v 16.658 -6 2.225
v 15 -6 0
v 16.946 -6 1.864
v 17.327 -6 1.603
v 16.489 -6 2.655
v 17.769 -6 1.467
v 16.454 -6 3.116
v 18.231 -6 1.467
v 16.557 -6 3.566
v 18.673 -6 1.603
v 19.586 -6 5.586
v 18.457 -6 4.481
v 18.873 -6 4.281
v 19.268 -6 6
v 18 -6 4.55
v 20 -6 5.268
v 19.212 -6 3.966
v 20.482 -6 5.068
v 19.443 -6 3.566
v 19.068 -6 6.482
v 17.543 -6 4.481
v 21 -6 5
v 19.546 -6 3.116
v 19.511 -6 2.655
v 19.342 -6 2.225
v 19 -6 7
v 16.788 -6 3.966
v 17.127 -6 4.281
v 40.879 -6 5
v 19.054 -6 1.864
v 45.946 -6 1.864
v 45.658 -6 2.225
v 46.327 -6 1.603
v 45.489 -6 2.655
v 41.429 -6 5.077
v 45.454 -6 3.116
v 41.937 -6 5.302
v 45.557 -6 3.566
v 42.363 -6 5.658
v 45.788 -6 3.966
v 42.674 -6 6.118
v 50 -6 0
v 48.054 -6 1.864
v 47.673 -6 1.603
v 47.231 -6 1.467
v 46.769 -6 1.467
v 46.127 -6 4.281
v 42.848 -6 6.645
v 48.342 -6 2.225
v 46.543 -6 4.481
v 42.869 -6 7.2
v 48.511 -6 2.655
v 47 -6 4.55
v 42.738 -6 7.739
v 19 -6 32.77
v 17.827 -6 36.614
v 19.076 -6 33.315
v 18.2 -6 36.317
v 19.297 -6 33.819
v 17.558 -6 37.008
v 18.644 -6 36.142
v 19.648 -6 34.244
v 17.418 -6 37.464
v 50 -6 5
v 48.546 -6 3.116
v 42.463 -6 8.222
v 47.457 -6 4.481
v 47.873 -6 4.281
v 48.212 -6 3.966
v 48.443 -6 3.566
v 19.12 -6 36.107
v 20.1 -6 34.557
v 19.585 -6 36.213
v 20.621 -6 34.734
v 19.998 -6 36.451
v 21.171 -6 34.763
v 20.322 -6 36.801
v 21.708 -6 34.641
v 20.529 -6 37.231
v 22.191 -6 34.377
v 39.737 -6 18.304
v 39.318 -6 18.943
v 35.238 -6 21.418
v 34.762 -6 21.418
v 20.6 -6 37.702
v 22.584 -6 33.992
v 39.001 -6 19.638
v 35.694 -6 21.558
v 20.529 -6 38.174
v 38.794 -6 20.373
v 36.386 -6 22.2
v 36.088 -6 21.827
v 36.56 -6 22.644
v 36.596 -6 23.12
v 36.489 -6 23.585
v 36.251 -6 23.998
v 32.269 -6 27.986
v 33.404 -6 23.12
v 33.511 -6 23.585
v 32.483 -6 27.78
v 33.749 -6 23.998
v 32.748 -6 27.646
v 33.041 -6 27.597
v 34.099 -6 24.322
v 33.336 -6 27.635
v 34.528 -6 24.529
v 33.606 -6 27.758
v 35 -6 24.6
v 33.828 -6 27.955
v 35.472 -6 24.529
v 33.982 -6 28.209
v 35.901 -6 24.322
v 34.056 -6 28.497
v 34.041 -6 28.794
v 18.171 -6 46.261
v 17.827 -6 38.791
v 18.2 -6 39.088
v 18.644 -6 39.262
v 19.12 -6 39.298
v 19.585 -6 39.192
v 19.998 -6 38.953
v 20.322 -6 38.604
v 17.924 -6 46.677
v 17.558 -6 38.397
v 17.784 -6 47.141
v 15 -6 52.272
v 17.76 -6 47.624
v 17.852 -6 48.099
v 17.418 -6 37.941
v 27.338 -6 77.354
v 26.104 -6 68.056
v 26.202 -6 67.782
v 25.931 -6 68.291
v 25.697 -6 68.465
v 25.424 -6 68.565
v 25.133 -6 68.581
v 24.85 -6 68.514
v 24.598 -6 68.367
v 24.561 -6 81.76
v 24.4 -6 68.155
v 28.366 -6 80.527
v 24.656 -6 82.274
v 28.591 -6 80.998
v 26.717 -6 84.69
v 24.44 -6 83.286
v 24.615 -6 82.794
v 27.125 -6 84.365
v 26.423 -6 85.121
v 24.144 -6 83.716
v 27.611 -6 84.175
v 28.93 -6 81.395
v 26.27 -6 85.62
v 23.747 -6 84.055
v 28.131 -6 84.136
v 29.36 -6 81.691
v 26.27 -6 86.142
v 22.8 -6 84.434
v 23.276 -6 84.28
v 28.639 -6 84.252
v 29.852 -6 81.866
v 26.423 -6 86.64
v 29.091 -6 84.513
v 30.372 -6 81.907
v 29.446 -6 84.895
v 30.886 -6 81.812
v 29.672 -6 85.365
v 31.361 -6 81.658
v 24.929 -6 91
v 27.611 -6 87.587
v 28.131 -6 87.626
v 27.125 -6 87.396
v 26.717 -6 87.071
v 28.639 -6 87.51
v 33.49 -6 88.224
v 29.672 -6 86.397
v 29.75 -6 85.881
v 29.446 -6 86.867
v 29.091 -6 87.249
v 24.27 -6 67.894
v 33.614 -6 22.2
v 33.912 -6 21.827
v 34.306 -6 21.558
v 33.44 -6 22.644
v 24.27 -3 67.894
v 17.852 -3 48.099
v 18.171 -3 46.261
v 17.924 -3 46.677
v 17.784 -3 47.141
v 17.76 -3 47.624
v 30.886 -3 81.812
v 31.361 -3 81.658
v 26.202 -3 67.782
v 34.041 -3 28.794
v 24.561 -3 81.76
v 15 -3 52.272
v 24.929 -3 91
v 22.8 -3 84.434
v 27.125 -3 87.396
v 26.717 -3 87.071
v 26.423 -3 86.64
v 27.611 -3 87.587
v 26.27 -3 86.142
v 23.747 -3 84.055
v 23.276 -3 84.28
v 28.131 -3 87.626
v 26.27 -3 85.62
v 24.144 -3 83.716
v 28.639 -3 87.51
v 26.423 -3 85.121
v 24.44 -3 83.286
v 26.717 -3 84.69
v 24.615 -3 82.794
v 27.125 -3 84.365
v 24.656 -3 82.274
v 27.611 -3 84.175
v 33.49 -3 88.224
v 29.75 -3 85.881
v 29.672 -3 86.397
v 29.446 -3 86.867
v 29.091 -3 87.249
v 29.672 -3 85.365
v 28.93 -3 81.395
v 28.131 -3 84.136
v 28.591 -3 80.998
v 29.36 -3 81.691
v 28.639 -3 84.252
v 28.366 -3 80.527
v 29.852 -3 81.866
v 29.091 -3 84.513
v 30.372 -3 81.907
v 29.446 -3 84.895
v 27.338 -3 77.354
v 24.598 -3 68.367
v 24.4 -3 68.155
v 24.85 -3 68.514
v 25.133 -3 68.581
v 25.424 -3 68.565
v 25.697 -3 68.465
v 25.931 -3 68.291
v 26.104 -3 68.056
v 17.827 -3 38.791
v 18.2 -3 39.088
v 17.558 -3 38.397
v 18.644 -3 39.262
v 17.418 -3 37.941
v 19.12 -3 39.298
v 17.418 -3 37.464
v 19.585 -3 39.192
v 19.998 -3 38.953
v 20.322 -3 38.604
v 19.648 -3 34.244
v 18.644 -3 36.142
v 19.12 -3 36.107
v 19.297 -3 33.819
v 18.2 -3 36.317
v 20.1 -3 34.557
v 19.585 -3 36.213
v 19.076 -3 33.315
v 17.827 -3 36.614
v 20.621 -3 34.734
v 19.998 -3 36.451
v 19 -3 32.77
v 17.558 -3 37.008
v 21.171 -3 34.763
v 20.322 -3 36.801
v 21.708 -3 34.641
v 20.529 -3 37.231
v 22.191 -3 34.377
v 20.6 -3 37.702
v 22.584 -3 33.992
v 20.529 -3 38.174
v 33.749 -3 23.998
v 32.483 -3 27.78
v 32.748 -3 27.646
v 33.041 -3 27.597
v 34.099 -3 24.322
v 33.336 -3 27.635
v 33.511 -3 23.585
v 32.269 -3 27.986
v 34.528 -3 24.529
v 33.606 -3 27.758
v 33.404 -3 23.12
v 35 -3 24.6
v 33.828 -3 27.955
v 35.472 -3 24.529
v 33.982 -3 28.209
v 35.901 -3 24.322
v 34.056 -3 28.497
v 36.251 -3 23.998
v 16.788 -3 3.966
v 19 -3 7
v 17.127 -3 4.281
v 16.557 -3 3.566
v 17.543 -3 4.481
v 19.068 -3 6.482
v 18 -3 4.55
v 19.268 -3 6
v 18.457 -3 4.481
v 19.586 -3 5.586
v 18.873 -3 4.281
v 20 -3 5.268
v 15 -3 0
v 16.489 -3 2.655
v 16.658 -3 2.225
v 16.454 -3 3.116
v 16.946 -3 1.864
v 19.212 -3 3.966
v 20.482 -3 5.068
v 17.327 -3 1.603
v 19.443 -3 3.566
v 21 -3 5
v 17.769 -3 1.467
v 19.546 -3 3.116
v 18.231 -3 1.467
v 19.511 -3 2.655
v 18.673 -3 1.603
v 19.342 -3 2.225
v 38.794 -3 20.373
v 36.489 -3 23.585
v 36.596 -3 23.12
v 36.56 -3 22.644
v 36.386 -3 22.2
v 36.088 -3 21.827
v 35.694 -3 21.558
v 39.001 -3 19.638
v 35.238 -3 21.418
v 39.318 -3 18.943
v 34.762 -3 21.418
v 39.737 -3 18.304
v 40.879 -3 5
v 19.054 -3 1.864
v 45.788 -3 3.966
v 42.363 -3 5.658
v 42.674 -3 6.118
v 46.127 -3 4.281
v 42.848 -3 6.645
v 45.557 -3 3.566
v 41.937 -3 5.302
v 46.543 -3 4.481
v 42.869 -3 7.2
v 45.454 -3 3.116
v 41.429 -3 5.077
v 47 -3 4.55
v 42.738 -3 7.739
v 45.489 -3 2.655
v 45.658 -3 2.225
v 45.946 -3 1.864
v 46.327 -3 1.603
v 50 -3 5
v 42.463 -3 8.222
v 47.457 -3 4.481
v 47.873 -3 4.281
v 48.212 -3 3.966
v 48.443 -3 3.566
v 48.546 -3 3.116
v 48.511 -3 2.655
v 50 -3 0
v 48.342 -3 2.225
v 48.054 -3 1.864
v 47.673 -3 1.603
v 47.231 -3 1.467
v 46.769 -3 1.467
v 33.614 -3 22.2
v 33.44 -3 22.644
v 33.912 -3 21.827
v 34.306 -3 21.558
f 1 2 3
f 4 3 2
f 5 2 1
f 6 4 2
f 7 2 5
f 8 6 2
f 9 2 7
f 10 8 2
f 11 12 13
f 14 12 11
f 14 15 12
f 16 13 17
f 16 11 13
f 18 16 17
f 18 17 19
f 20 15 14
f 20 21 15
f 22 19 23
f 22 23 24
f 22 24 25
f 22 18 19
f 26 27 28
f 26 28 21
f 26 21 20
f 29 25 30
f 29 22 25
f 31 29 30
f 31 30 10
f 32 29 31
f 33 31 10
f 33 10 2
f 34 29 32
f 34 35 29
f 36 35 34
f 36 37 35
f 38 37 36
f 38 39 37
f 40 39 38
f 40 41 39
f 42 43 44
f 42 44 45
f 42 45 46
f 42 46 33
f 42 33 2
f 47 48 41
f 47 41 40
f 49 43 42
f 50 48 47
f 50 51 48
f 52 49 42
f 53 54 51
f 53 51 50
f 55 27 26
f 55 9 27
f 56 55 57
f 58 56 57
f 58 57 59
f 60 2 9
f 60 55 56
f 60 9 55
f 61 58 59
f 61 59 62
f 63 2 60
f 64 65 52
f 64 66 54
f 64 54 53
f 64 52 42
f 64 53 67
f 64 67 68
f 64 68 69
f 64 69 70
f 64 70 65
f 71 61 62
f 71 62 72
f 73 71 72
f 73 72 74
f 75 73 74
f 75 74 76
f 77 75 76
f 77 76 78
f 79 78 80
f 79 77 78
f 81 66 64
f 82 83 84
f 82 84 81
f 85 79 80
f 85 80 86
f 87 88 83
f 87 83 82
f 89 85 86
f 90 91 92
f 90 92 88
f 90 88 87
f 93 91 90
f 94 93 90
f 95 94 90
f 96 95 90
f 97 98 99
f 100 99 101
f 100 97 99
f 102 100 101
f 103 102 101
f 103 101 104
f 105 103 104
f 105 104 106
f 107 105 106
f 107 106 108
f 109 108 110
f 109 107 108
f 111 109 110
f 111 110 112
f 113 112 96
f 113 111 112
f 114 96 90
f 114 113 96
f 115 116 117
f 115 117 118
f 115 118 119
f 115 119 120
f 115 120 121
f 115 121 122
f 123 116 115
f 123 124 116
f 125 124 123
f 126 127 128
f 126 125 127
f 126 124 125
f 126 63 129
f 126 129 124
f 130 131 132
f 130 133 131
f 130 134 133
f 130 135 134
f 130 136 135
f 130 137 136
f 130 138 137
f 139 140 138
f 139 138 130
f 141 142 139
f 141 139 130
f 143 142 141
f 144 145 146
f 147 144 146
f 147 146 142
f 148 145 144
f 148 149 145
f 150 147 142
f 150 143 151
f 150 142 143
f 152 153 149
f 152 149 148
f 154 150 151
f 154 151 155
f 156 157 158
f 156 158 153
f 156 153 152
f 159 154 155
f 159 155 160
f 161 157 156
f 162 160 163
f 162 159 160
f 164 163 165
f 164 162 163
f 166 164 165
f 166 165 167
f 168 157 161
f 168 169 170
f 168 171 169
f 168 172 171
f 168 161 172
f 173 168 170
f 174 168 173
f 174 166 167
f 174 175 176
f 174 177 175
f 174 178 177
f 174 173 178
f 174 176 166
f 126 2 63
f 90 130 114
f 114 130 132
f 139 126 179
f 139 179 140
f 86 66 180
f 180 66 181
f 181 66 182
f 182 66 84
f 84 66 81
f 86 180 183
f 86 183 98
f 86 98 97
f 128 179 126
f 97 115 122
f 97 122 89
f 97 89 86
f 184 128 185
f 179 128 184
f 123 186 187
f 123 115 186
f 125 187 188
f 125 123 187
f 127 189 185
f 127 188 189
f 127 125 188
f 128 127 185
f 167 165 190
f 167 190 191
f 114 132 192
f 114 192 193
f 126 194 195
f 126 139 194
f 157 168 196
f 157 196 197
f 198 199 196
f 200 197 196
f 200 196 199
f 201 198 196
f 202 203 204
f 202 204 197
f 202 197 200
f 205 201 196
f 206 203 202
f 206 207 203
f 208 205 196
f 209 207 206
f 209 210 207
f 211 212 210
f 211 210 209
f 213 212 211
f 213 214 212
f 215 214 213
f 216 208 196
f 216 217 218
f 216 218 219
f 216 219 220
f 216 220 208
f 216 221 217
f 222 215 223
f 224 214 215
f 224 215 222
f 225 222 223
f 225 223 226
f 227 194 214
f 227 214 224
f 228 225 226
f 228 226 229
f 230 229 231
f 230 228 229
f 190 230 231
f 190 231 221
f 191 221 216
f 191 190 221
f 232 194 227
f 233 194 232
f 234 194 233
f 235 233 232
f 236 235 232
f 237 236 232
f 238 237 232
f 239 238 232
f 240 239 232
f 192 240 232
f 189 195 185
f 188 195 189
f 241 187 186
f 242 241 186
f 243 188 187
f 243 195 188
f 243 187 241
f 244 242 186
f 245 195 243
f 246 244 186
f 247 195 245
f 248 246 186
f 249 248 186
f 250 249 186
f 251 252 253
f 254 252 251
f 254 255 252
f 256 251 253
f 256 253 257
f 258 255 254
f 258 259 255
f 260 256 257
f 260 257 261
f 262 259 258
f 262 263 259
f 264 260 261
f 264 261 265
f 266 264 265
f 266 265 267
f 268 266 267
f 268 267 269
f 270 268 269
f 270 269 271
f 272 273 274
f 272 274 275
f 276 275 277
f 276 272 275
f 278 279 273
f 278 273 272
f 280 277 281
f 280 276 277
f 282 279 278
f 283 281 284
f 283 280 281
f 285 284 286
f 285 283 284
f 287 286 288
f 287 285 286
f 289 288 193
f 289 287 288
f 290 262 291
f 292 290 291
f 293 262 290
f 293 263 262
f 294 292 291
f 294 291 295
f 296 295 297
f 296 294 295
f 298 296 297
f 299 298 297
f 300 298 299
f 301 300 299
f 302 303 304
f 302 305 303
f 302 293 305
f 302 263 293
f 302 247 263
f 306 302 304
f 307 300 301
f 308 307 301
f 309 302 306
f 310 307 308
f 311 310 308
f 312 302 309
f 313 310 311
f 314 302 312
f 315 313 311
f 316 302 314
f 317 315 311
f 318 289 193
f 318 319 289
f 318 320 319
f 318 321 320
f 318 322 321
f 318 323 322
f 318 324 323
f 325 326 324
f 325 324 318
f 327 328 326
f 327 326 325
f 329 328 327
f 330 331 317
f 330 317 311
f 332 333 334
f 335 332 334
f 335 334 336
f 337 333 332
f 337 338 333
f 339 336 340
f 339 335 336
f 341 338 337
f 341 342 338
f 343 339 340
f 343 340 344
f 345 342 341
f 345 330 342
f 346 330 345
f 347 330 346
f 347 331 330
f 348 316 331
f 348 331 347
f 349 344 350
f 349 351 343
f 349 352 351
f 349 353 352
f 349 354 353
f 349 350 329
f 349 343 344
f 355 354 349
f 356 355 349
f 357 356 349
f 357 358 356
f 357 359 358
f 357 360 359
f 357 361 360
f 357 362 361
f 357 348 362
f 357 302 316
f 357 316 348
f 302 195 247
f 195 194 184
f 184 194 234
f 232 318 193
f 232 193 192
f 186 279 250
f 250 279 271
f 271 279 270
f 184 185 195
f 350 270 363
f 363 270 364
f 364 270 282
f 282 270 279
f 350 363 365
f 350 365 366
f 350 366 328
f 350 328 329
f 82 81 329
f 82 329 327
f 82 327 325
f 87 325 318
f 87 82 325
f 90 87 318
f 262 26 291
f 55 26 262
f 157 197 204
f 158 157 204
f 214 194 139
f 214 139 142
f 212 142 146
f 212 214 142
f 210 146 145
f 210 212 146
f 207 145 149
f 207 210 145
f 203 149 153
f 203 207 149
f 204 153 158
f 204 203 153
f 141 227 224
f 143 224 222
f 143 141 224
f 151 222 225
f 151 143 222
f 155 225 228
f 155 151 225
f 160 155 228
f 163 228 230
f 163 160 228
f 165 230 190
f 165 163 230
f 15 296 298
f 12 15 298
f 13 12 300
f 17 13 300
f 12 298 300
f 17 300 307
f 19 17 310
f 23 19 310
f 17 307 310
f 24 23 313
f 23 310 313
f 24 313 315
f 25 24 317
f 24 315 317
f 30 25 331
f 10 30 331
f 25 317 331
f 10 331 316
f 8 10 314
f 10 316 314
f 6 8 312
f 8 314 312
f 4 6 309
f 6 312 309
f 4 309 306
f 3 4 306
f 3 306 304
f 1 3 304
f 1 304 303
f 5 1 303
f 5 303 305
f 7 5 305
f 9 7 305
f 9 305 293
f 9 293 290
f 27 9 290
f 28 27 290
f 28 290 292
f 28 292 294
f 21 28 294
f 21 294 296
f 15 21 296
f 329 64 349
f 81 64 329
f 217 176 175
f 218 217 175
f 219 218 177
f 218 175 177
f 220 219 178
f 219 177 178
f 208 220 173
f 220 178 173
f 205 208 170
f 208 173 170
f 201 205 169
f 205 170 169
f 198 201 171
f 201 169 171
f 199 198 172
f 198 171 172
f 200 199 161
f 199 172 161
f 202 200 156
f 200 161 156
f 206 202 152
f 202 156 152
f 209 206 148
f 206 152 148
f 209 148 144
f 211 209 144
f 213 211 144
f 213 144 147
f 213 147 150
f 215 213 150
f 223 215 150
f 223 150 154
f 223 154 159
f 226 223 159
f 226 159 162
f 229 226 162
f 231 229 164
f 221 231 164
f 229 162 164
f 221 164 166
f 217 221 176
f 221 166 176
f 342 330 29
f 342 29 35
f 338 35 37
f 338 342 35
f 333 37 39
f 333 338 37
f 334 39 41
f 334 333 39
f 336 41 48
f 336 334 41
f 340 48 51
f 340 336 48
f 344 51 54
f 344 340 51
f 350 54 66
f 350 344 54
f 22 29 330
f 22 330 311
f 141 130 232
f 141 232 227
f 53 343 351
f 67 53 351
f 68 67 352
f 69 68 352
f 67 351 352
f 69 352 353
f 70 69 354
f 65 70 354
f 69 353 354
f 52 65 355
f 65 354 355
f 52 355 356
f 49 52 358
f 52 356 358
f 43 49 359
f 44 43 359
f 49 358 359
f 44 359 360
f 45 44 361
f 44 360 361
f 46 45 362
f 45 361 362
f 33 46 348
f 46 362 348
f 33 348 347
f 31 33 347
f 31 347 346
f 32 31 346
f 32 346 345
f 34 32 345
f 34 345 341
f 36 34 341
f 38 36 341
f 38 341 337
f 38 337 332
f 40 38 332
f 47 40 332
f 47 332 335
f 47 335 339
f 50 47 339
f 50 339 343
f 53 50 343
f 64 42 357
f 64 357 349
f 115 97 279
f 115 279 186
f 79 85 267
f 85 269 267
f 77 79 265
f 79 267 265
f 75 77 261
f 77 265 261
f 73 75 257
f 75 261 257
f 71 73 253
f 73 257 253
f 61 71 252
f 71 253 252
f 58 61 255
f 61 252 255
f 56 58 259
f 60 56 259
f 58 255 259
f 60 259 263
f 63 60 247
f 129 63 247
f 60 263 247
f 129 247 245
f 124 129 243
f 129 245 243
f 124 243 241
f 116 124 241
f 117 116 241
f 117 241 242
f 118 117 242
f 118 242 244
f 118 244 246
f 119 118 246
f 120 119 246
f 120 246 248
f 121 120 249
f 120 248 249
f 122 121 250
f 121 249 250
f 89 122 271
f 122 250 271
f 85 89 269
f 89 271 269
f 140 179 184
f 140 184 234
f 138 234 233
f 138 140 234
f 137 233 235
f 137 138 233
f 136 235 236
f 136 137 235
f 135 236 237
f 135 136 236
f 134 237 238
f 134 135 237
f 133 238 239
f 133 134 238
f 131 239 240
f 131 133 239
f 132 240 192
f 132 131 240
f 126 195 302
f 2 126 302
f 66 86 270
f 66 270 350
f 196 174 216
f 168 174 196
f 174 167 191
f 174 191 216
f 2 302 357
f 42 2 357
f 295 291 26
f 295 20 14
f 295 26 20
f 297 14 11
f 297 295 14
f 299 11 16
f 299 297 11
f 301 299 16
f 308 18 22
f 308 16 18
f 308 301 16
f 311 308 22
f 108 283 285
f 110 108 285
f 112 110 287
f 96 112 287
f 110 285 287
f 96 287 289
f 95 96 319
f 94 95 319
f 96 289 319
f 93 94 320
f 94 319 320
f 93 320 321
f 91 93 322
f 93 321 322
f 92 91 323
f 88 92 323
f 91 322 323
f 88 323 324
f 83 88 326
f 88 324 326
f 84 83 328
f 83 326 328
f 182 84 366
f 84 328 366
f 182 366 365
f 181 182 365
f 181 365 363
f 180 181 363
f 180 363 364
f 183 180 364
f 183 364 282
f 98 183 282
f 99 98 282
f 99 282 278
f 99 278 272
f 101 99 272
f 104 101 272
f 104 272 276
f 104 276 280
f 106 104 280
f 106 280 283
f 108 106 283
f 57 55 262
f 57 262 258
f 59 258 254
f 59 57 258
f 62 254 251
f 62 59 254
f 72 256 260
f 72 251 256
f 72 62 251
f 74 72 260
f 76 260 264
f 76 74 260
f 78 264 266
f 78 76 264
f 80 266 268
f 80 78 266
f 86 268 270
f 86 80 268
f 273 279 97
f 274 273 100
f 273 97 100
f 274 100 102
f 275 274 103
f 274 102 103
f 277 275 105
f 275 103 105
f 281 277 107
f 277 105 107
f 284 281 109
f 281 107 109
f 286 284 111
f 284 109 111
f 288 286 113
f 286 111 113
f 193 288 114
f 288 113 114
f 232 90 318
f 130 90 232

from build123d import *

# Parameters (mm, degrees)
EXTRUDE_1_DEPTH      = 4
EXTRUDE_1_DEPTH_BACK = 3
SKETCH_1_W           = 100
SKETCH_1_H           = 14
SKETCH_1_R           = 1.75
SKETCH_2_W           = 88
SKETCH_2_H           = 14
EXTRUDE_2_DEPTH      = 3
SKETCH_10_W          = 88
SKETCH_10_H          = 4
EXTRUDE_5_DEPTH      = 35
SKETCH_11_R          = 1.6
CUT_EXTRUDE_3_DEPTH  = 25
SKETCH_19_W          = 65
SKETCH_19_H          = 14
CUT_EXTRUDE_7_DEPTH  = 10
SKETCH_21_R          = 1.75
CUT_EXTRUDE_9_DEPTH  = 25
FILLET_3_R           = 2
FILLET_4_R           = 1
FILLET_5_R           = 5
CUT_EXTRUDE_14_REACH = 106.771
SKETCH_27_W          = 35
SKETCH_27_H          = 3
SKETCH_28_W          = 56.249176637
SKETCH_28_H          = 109.102130605
CUT_EXTRUDE_15_DEPTH = 10
CUT_EXTRUDE_16_DEPTH = 1
SKETCH_34_R          = 1.55
CUT_EXTRUDE_17_DEPTH = 104.874924789
SKETCH_35_R          = 1.6
CUT_EXTRUDE_18_DEPTH = 10


with BuildPart() as part:
    # 草图1 → 凸台-拉伸1 (new, two sides: drawn at the far end of the back side and taken through both)
    # profile 1 of 3: a face of its own
    with BuildSketch(Plane.XY.offset(-EXTRUDE_1_DEPTH_BACK)):
        Rectangle(SKETCH_1_W, SKETCH_1_H)
        with Locations((26.315, 2.5)):
            Circle(SKETCH_1_R, mode=Mode.SUBTRACT)
        with Locations((26.315, -2.5)):
            Circle(SKETCH_1_R, mode=Mode.SUBTRACT)
        with Locations((-26.315, -2.5)):
            Circle(SKETCH_1_R, mode=Mode.SUBTRACT)
        with Locations((-26.315, 2.5)):
            Circle(SKETCH_1_R, mode=Mode.SUBTRACT)
    # profile 2 of 3: a face of its own
    with BuildSketch(Plane.XY.offset(-EXTRUDE_1_DEPTH_BACK)):
        with Locations((-26.315, -2.5)):
            Circle(SKETCH_1_R)
    # profile 3 of 3: a face of its own
    with BuildSketch(Plane.XY.offset(-EXTRUDE_1_DEPTH_BACK)):
        with Locations((26.315, -2.5)):
            Circle(SKETCH_1_R)
    extrude(amount=EXTRUDE_1_DEPTH + EXTRUDE_1_DEPTH_BACK)

    # 草图2 → 凸台-拉伸2 (add)
    with BuildSketch(Plane(origin=(15, 0, 0), x_dir=(0, 0, -1), z_dir=(1, 0, 0))):
        with Locations((-47, 0)):
            Rectangle(SKETCH_2_W, SKETCH_2_H)
    extrude(amount=EXTRUDE_2_DEPTH)

    # 草图10 → 凸台-拉伸5 (add)
    with BuildSketch(Plane(origin=(18, 0, 0), x_dir=(0, 0, -1), z_dir=(1, 0, 0))):
        with Locations((-47, -5)):
            Rectangle(SKETCH_10_W, SKETCH_10_H)
        with Locations((-47, 5)):
            Rectangle(SKETCH_10_W, SKETCH_10_H)
    extrude(amount=EXTRUDE_5_DEPTH)

    # 草图11 → 切除-拉伸3 (cut, symmetric)
    with BuildSketch(Plane(origin=(0, 0, 0), x_dir=(1, 0, 0), z_dir=(0, 1, 0))):
        Polygon((39.023998465, -19.228520587), (27.337663153, -77.353689014), (28.983307446, -82.429042884), (31.361421746, -81.657957689), (33.490440504, -88.2240933), (24.929229025, -91), (53, -91), (53, 0), (50, 0), (50, -5), align=None)
        Polygon((15, -91), (24.929229025, -91), (22.800210266, -84.433864389), (25.178324566, -83.662779195), (15, -52.271670437), align=None)
        Polygon((34.885276375, -24.593670389), (17.526825547, -47.095951771), (25.448841284, -71.528347887), align=None)
        with BuildLine():
            Line((19, -5), (19, -32.770283869))
            ThreePointArc((19, -32.770283869), (20.354693788, -34.663318442), (22.583579893, -33.991870838))
            Line((22.583579893, -33.991870838), (44.948155104, -5))
            Line((44.948155104, -5), (19, -5))
        make_face()
        with Locations((19, -37.702345436)):
            Circle(SKETCH_11_R)
    extrude(amount=CUT_EXTRUDE_3_DEPTH, both=True, mode=Mode.SUBTRACT)

    # 草图19 → 切除-拉伸7 (cut)
    with BuildSketch(Plane.XY.offset(4)):
        with Locations((-17.5, 0)):
            Rectangle(SKETCH_19_W, SKETCH_19_H)
    extrude(amount=-CUT_EXTRUDE_7_DEPTH, mode=Mode.SUBTRACT)

    # 草图21 → 切除-拉伸9 (cut, symmetric)
    with BuildSketch(Plane(origin=(0, 0, 0.28540368), x_dir=(1, 0, 0), z_dir=(0, -1, 0))):
        with Locations((28, 85.595375174)):
            Circle(SKETCH_21_R)
    extrude(amount=CUT_EXTRUDE_9_DEPTH, both=True, mode=Mode.SUBTRACT)

    # 圆角3
    # the kernel refuses this fillet: 2 mm, written as the material it adds along each edge
    with BuildSketch(Plane(origin=(25.178324566, 7, 83.662779195), x_dir=(-0.3084340777609257, 0, -0.9512457199250713), z_dir=(0, -1, 0)), Plane(origin=(25.178324566, -3, 83.662779195), x_dir=(-0.3084340777609257, 0, -0.9512457199250713), z_dir=(0, -1, 0)), Plane(origin=(19, 7, 5), x_dir=(0, 0, 1), z_dir=(0, -1, 0)), Plane(origin=(19, -3, 5), x_dir=(0, 0, 1), z_dir=(0, -1, 0)), Plane(origin=(28.983307446, 3, 82.429042884), x_dir=(-0.30843407776092724, 0, -0.9512457199250708), z_dir=(0, 1, 0)), Plane(origin=(28.983307446, -7, 82.429042884), x_dir=(-0.30843407776092724, 0, -0.9512457199250708), z_dir=(0, 1, 0))) as fillet_3_piece_1:
        with BuildLine():
            CenterArc((FILLET_3_R, -FILLET_3_R), FILLET_3_R, 90, 90)
            Line((0, -FILLET_3_R), (0, 0))
            Line((0, 0), (FILLET_3_R, 0))
        make_face()
    extrude(amount=4)
    with BuildSketch(Plane(origin=(17.526825547, -7, 47.095951771), x_dir=(0.6107934844398675, 0, -0.7917899464920006), z_dir=(0, 1, 0))) as fillet_3_piece_2_section:
        with BuildLine():
            CenterArc((FILLET_3_R * 0.527371630949, -FILLET_3_R), FILLET_3_R, 90, 55.611785257)
            Line((-FILLET_3_R * 0.297858058809, -FILLET_3_R * 0.435202727395), (0, 0))
            Line((0, 0), (FILLET_3_R * 0.527371630949, 0))
        make_face()
    fillet_3_piece_2 = extrude(amount=14, mode=Mode.PRIVATE)
    fillet_3_piece_2 = split(fillet_3_piece_2, bisect_by=Plane(origin=(18.071498968, -3, 46.365808537), z_dir=(0, -1, 0)), keep=Keep.TOP, mode=Mode.PRIVATE)
    fillet_3_piece_2 = split(fillet_3_piece_2, bisect_by=Plane(origin=(18, -5, 46.365808537), z_dir=(1, 0, 0)), keep=Keep.TOP, mode=Mode.PRIVATE)
    add(fillet_3_piece_2)
    with BuildSketch(Plane(origin=(17.526825547, -7, 47.095951771), x_dir=(0.6107934844398675, 0, -0.7917899464920006), z_dir=(0, 1, 0))) as fillet_3_piece_3_section:
        with BuildLine():
            CenterArc((FILLET_3_R * 0.527371630949, -FILLET_3_R), FILLET_3_R, 90, 55.611785257)
            Line((-FILLET_3_R * 0.297858058809, -FILLET_3_R * 0.435202727395), (0, 0))
            Line((0, 0), (FILLET_3_R * 0.527371630949, 0))
        make_face()
    fillet_3_piece_3 = extrude(amount=14, mode=Mode.PRIVATE)
    fillet_3_piece_3 = split(fillet_3_piece_3, bisect_by=Plane(origin=(17.718589795, -3, 47.171312239), z_dir=(0, -1, 0)), keep=Keep.TOP, mode=Mode.PRIVATE)
    fillet_3_piece_3 = split(fillet_3_piece_3, bisect_by=Plane(origin=(18, -5, 47.171312239), z_dir=(-1, 0, 0)), keep=Keep.TOP, mode=Mode.PRIVATE)
    add(fillet_3_piece_3)
    with BuildSketch(Plane(origin=(17.526825547, -7, 47.095951771), x_dir=(0.6107934844398675, 0, -0.7917899464920006), z_dir=(0, 1, 0))) as fillet_3_piece_4_section:
        with BuildLine():
            CenterArc((FILLET_3_R * 0.527371630949, -FILLET_3_R), FILLET_3_R, 90, 55.611785257)
            Line((-FILLET_3_R * 0.297858058809, -FILLET_3_R * 0.435202727395), (0, 0))
            Line((0, 0), (FILLET_3_R * 0.527371630949, 0))
        make_face()
    fillet_3_piece_4 = extrude(amount=14, mode=Mode.PRIVATE)
    fillet_3_piece_4 = split(fillet_3_piece_4, bisect_by=Plane(origin=(17.718589795, -3, 47.171312239), z_dir=(0, 1, 0)), keep=Keep.TOP, mode=Mode.PRIVATE)
    fillet_3_piece_4 = split(fillet_3_piece_4, bisect_by=Plane(origin=(18, 0, 47.171312239), z_dir=(-1, 0, 0)), keep=Keep.TOP, mode=Mode.PRIVATE)
    fillet_3_piece_4 = split(fillet_3_piece_4, bisect_by=Plane(origin=(17.718589795, 3, 47.171312239), z_dir=(0, -1, 0)), keep=Keep.TOP, mode=Mode.PRIVATE)
    add(fillet_3_piece_4)
    with BuildSketch(Plane(origin=(17.526825547, -7, 47.095951771), x_dir=(0.6107934844398675, 0, -0.7917899464920006), z_dir=(0, 1, 0))) as fillet_3_piece_5_section:
        with BuildLine():
            CenterArc((FILLET_3_R * 0.527371630949, -FILLET_3_R), FILLET_3_R, 90, 55.611785257)
            Line((-FILLET_3_R * 0.297858058809, -FILLET_3_R * 0.435202727395), (0, 0))
            Line((0, 0), (FILLET_3_R * 0.527371630949, 0))
        make_face()
    fillet_3_piece_5 = extrude(amount=14, mode=Mode.PRIVATE)
    fillet_3_piece_5 = split(fillet_3_piece_5, bisect_by=Plane(origin=(18, 5, 46.365808537), z_dir=(1, 0, 0)), keep=Keep.TOP, mode=Mode.PRIVATE)
    fillet_3_piece_5 = split(fillet_3_piece_5, bisect_by=Plane(origin=(18.071498968, 3, 46.365808537), z_dir=(0, 1, 0)), keep=Keep.TOP, mode=Mode.PRIVATE)
    add(fillet_3_piece_5)
    with BuildSketch(Plane(origin=(17.526825547, -7, 47.095951771), x_dir=(0.6107934844398675, 0, -0.7917899464920006), z_dir=(0, 1, 0))) as fillet_3_piece_6_section:
        with BuildLine():
            CenterArc((FILLET_3_R * 0.527371630949, -FILLET_3_R), FILLET_3_R, 90, 55.611785257)
            Line((-FILLET_3_R * 0.297858058809, -FILLET_3_R * 0.435202727395), (0, 0))
            Line((0, 0), (FILLET_3_R * 0.527371630949, 0))
        make_face()
    fillet_3_piece_6 = extrude(amount=14, mode=Mode.PRIVATE)
    fillet_3_piece_6 = split(fillet_3_piece_6, bisect_by=Plane(origin=(18, 5, 47.171312239), z_dir=(-1, 0, 0)), keep=Keep.TOP, mode=Mode.PRIVATE)
    fillet_3_piece_6 = split(fillet_3_piece_6, bisect_by=Plane(origin=(17.718589795, 3, 47.171312239), z_dir=(0, 1, 0)), keep=Keep.TOP, mode=Mode.PRIVATE)
    add(fillet_3_piece_6)
    with BuildSketch(Plane(origin=(44.948155104, 7.171848554, 5), x_dir=(-1, 0, 0), z_dir=(0, -1, 0))) as fillet_3_piece_7_section:
        with BuildLine():
            CenterArc((FILLET_3_R * 2.03436971078, -FILLET_3_R), FILLET_3_R, 90, 127.646899195)
            Line((FILLET_3_R * 1.24257976428, -FILLET_3_R * 1.61079348444), (0, 0))
            Line((0, 0), (FILLET_3_R * 2.03436971078, 0))
        make_face()
    fillet_3_piece_7 = extrude(amount=14.171848554, mode=Mode.PRIVATE)
    fillet_3_piece_7 = split(fillet_3_piece_7, bisect_by=Plane(origin=(43.295874914, 7, 5.81218285), z_dir=(0, -1, 0)), keep=Keep.TOP, mode=Mode.PRIVATE)
    fillet_3_piece_7 = split(fillet_3_piece_7, bisect_by=Plane(origin=(43.295874914, 3, 5.81218285), z_dir=(0, 1, 0)), keep=Keep.TOP, mode=Mode.PRIVATE)
    add(fillet_3_piece_7)
    with BuildSketch(Plane(origin=(44.948155104, -3, 5), x_dir=(-1, 0, 0), z_dir=(0, -1, 0)), Plane(origin=(44.948155104, 7, 5), x_dir=(-1, 0, 0), z_dir=(0, -1, 0))) as fillet_3_piece_8:
        with BuildLine():
            CenterArc((FILLET_3_R * 2.03436971078, -FILLET_3_R), FILLET_3_R, 90, 127.646899195)
            Line((FILLET_3_R * 1.24257976428, -FILLET_3_R * 1.61079348444), (0, 0))
            Line((0, 0), (FILLET_3_R * 2.03436971078, 0))
        make_face()
    extrude(amount=4)
    with BuildSketch(Plane(origin=(44.948155104, 7, 5), x_dir=(-1, 0, 0), z_dir=(0, -1, 0))) as fillet_3_piece_9_section:
        with BuildLine():
            CenterArc((FILLET_3_R * 2.03436971078, -FILLET_3_R), FILLET_3_R, 90, 127.646899195)
            Line((FILLET_3_R * 1.24257976428, -FILLET_3_R * 1.61079348444), (0, 0))
            Line((0, 0), (FILLET_3_R * 2.03436971078, 0))
        make_face()
    fillet_3_piece_9 = extrude(amount=14.171848554, mode=Mode.PRIVATE)
    fillet_3_piece_9 = split(fillet_3_piece_9, bisect_by=Plane(origin=(43.295874914, -7, 5.81218285), z_dir=(0, 1, 0)), keep=Keep.TOP, mode=Mode.PRIVATE)
    fillet_3_piece_9 = split(fillet_3_piece_9, bisect_by=Plane(origin=(43.295874914, -3, 5.81218285), z_dir=(0, -1, 0)), keep=Keep.TOP, mode=Mode.PRIVATE)
    add(fillet_3_piece_9)

    # 圆角4
    fillet_4_edges = [part.edges().sort_by_distance(p)[0] for p in [
        (34.885276375, 5, 24.593670389),
        (34.885276375, -5, 24.593670389),
        (25.448841284, -5, 71.528347887),
        (25.448841284, 5, 71.528347887),
    ]]
    fillet(fillet_4_edges, radius=FILLET_4_R)

    # 圆角5
    fillet_5_edges = [part.edges().sort_by_distance(p)[0] for p in [
        (39.023998465, 5, 19.228520587),
        (39.023998465, -5, 19.228520587),
    ]]
    fillet(fillet_5_edges, radius=FILLET_5_R)

    # 草图27 → 切除-拉伸14 (cut, up to next)
    with BuildSketch(Plane(origin=(0, 7, 0), x_dir=(1, 0, 0), z_dir=(0, 1, 0)), mode=Mode.PRIVATE) as cut_extrude_14_sk1:
        with Locations((32.5, 1.5)):
            Rectangle(SKETCH_27_W, SKETCH_27_H)
    cut_extrude_14_tool1 = extrude(cut_extrude_14_sk1.sketch, amount=-CUT_EXTRUDE_14_REACH, mode=Mode.PRIVATE) & part.part
    add(cut_extrude_14_tool1.solids().sort_by_distance((32.5, 7, -1.5))[0], mode=Mode.SUBTRACT)

    # 草图28 → 切除-拉伸15 (cut)
    with BuildSketch(Plane(origin=(0, 7, 0), x_dir=(1, 0, 0), z_dir=(0, 1, 0))):
        with Locations((28.124588319, -46.75205982)):
            Rectangle(SKETCH_28_W, SKETCH_28_H)
    extrude(amount=-CUT_EXTRUDE_15_DEPTH, mode=Mode.SUBTRACT)

    # 草图33 → 切除-拉伸16 (cut)
    with BuildSketch(Plane.XZ.offset(7)):
        with BuildLine():
            Line((15, 52.271670437), (15, 0))
            Line((15, 0), (50, 0))
            Line((50, 0), (50, 5))
            Line((50, 5), (39.736895245, 18.304371071))
            ThreePointArc((39.736895245, 18.304371071), (39.146308678, 19.2842798), (38.793938309, 20.372787371))
            Line((38.793938309, 20.372787371), (27.337663153, 77.353689014))
            Line((27.337663153, 77.353689014), (28.36643929, 80.526551444))
            ThreePointArc((28.36643929, 80.526551444), (29.359857788, 81.691139542), (30.885798886, 81.812174728))
            Line((30.885798886, 81.812174728), (31.361421746, 81.657957689))
            Line((31.361421746, 81.657957689), (33.490440504, 88.2240933))
            Line((33.490440504, 88.2240933), (24.929229025, 91))
            Line((24.929229025, 91), (22.800210266, 84.433864389))
            Line((22.800210266, 84.433864389), (23.275833126, 84.27964735))
            ThreePointArc((23.275833126, 84.27964735), (24.440421225, 83.286228853), (24.561456411, 81.760287755))
            Line((24.561456411, 81.760287755), (15, 52.271670437))
        make_face()
    extrude(amount=-CUT_EXTRUDE_16_DEPTH, mode=Mode.SUBTRACT)

    # 草图34 → 切除-拉伸17 (cut, through all)
    with BuildSketch(Plane(origin=(0, -3, 0), x_dir=(1, 0, 0), z_dir=(0, 1, 0))):
        with Locations(Location((18, -3, 0), (0, 0, 270))):
            Circle(SKETCH_34_R)
        with Locations(Location((47, -3, 0), (0, 0, 270))):
            Circle(SKETCH_34_R)
    extrude(amount=-CUT_EXTRUDE_17_DEPTH, mode=Mode.SUBTRACT)

    # 草图35 → 切除-拉伸18 (cut)
    with BuildSketch(Plane(origin=(0, -3, 0), x_dir=(1, 0, 0), z_dir=(0, 1, 0))):
        with Locations(Location((35, -23, 0), (0, 0, 270))):
            Circle(SKETCH_35_R)
    extrude(amount=-CUT_EXTRUDE_18_DEPTH, mode=Mode.SUBTRACT)


solid = part.part
